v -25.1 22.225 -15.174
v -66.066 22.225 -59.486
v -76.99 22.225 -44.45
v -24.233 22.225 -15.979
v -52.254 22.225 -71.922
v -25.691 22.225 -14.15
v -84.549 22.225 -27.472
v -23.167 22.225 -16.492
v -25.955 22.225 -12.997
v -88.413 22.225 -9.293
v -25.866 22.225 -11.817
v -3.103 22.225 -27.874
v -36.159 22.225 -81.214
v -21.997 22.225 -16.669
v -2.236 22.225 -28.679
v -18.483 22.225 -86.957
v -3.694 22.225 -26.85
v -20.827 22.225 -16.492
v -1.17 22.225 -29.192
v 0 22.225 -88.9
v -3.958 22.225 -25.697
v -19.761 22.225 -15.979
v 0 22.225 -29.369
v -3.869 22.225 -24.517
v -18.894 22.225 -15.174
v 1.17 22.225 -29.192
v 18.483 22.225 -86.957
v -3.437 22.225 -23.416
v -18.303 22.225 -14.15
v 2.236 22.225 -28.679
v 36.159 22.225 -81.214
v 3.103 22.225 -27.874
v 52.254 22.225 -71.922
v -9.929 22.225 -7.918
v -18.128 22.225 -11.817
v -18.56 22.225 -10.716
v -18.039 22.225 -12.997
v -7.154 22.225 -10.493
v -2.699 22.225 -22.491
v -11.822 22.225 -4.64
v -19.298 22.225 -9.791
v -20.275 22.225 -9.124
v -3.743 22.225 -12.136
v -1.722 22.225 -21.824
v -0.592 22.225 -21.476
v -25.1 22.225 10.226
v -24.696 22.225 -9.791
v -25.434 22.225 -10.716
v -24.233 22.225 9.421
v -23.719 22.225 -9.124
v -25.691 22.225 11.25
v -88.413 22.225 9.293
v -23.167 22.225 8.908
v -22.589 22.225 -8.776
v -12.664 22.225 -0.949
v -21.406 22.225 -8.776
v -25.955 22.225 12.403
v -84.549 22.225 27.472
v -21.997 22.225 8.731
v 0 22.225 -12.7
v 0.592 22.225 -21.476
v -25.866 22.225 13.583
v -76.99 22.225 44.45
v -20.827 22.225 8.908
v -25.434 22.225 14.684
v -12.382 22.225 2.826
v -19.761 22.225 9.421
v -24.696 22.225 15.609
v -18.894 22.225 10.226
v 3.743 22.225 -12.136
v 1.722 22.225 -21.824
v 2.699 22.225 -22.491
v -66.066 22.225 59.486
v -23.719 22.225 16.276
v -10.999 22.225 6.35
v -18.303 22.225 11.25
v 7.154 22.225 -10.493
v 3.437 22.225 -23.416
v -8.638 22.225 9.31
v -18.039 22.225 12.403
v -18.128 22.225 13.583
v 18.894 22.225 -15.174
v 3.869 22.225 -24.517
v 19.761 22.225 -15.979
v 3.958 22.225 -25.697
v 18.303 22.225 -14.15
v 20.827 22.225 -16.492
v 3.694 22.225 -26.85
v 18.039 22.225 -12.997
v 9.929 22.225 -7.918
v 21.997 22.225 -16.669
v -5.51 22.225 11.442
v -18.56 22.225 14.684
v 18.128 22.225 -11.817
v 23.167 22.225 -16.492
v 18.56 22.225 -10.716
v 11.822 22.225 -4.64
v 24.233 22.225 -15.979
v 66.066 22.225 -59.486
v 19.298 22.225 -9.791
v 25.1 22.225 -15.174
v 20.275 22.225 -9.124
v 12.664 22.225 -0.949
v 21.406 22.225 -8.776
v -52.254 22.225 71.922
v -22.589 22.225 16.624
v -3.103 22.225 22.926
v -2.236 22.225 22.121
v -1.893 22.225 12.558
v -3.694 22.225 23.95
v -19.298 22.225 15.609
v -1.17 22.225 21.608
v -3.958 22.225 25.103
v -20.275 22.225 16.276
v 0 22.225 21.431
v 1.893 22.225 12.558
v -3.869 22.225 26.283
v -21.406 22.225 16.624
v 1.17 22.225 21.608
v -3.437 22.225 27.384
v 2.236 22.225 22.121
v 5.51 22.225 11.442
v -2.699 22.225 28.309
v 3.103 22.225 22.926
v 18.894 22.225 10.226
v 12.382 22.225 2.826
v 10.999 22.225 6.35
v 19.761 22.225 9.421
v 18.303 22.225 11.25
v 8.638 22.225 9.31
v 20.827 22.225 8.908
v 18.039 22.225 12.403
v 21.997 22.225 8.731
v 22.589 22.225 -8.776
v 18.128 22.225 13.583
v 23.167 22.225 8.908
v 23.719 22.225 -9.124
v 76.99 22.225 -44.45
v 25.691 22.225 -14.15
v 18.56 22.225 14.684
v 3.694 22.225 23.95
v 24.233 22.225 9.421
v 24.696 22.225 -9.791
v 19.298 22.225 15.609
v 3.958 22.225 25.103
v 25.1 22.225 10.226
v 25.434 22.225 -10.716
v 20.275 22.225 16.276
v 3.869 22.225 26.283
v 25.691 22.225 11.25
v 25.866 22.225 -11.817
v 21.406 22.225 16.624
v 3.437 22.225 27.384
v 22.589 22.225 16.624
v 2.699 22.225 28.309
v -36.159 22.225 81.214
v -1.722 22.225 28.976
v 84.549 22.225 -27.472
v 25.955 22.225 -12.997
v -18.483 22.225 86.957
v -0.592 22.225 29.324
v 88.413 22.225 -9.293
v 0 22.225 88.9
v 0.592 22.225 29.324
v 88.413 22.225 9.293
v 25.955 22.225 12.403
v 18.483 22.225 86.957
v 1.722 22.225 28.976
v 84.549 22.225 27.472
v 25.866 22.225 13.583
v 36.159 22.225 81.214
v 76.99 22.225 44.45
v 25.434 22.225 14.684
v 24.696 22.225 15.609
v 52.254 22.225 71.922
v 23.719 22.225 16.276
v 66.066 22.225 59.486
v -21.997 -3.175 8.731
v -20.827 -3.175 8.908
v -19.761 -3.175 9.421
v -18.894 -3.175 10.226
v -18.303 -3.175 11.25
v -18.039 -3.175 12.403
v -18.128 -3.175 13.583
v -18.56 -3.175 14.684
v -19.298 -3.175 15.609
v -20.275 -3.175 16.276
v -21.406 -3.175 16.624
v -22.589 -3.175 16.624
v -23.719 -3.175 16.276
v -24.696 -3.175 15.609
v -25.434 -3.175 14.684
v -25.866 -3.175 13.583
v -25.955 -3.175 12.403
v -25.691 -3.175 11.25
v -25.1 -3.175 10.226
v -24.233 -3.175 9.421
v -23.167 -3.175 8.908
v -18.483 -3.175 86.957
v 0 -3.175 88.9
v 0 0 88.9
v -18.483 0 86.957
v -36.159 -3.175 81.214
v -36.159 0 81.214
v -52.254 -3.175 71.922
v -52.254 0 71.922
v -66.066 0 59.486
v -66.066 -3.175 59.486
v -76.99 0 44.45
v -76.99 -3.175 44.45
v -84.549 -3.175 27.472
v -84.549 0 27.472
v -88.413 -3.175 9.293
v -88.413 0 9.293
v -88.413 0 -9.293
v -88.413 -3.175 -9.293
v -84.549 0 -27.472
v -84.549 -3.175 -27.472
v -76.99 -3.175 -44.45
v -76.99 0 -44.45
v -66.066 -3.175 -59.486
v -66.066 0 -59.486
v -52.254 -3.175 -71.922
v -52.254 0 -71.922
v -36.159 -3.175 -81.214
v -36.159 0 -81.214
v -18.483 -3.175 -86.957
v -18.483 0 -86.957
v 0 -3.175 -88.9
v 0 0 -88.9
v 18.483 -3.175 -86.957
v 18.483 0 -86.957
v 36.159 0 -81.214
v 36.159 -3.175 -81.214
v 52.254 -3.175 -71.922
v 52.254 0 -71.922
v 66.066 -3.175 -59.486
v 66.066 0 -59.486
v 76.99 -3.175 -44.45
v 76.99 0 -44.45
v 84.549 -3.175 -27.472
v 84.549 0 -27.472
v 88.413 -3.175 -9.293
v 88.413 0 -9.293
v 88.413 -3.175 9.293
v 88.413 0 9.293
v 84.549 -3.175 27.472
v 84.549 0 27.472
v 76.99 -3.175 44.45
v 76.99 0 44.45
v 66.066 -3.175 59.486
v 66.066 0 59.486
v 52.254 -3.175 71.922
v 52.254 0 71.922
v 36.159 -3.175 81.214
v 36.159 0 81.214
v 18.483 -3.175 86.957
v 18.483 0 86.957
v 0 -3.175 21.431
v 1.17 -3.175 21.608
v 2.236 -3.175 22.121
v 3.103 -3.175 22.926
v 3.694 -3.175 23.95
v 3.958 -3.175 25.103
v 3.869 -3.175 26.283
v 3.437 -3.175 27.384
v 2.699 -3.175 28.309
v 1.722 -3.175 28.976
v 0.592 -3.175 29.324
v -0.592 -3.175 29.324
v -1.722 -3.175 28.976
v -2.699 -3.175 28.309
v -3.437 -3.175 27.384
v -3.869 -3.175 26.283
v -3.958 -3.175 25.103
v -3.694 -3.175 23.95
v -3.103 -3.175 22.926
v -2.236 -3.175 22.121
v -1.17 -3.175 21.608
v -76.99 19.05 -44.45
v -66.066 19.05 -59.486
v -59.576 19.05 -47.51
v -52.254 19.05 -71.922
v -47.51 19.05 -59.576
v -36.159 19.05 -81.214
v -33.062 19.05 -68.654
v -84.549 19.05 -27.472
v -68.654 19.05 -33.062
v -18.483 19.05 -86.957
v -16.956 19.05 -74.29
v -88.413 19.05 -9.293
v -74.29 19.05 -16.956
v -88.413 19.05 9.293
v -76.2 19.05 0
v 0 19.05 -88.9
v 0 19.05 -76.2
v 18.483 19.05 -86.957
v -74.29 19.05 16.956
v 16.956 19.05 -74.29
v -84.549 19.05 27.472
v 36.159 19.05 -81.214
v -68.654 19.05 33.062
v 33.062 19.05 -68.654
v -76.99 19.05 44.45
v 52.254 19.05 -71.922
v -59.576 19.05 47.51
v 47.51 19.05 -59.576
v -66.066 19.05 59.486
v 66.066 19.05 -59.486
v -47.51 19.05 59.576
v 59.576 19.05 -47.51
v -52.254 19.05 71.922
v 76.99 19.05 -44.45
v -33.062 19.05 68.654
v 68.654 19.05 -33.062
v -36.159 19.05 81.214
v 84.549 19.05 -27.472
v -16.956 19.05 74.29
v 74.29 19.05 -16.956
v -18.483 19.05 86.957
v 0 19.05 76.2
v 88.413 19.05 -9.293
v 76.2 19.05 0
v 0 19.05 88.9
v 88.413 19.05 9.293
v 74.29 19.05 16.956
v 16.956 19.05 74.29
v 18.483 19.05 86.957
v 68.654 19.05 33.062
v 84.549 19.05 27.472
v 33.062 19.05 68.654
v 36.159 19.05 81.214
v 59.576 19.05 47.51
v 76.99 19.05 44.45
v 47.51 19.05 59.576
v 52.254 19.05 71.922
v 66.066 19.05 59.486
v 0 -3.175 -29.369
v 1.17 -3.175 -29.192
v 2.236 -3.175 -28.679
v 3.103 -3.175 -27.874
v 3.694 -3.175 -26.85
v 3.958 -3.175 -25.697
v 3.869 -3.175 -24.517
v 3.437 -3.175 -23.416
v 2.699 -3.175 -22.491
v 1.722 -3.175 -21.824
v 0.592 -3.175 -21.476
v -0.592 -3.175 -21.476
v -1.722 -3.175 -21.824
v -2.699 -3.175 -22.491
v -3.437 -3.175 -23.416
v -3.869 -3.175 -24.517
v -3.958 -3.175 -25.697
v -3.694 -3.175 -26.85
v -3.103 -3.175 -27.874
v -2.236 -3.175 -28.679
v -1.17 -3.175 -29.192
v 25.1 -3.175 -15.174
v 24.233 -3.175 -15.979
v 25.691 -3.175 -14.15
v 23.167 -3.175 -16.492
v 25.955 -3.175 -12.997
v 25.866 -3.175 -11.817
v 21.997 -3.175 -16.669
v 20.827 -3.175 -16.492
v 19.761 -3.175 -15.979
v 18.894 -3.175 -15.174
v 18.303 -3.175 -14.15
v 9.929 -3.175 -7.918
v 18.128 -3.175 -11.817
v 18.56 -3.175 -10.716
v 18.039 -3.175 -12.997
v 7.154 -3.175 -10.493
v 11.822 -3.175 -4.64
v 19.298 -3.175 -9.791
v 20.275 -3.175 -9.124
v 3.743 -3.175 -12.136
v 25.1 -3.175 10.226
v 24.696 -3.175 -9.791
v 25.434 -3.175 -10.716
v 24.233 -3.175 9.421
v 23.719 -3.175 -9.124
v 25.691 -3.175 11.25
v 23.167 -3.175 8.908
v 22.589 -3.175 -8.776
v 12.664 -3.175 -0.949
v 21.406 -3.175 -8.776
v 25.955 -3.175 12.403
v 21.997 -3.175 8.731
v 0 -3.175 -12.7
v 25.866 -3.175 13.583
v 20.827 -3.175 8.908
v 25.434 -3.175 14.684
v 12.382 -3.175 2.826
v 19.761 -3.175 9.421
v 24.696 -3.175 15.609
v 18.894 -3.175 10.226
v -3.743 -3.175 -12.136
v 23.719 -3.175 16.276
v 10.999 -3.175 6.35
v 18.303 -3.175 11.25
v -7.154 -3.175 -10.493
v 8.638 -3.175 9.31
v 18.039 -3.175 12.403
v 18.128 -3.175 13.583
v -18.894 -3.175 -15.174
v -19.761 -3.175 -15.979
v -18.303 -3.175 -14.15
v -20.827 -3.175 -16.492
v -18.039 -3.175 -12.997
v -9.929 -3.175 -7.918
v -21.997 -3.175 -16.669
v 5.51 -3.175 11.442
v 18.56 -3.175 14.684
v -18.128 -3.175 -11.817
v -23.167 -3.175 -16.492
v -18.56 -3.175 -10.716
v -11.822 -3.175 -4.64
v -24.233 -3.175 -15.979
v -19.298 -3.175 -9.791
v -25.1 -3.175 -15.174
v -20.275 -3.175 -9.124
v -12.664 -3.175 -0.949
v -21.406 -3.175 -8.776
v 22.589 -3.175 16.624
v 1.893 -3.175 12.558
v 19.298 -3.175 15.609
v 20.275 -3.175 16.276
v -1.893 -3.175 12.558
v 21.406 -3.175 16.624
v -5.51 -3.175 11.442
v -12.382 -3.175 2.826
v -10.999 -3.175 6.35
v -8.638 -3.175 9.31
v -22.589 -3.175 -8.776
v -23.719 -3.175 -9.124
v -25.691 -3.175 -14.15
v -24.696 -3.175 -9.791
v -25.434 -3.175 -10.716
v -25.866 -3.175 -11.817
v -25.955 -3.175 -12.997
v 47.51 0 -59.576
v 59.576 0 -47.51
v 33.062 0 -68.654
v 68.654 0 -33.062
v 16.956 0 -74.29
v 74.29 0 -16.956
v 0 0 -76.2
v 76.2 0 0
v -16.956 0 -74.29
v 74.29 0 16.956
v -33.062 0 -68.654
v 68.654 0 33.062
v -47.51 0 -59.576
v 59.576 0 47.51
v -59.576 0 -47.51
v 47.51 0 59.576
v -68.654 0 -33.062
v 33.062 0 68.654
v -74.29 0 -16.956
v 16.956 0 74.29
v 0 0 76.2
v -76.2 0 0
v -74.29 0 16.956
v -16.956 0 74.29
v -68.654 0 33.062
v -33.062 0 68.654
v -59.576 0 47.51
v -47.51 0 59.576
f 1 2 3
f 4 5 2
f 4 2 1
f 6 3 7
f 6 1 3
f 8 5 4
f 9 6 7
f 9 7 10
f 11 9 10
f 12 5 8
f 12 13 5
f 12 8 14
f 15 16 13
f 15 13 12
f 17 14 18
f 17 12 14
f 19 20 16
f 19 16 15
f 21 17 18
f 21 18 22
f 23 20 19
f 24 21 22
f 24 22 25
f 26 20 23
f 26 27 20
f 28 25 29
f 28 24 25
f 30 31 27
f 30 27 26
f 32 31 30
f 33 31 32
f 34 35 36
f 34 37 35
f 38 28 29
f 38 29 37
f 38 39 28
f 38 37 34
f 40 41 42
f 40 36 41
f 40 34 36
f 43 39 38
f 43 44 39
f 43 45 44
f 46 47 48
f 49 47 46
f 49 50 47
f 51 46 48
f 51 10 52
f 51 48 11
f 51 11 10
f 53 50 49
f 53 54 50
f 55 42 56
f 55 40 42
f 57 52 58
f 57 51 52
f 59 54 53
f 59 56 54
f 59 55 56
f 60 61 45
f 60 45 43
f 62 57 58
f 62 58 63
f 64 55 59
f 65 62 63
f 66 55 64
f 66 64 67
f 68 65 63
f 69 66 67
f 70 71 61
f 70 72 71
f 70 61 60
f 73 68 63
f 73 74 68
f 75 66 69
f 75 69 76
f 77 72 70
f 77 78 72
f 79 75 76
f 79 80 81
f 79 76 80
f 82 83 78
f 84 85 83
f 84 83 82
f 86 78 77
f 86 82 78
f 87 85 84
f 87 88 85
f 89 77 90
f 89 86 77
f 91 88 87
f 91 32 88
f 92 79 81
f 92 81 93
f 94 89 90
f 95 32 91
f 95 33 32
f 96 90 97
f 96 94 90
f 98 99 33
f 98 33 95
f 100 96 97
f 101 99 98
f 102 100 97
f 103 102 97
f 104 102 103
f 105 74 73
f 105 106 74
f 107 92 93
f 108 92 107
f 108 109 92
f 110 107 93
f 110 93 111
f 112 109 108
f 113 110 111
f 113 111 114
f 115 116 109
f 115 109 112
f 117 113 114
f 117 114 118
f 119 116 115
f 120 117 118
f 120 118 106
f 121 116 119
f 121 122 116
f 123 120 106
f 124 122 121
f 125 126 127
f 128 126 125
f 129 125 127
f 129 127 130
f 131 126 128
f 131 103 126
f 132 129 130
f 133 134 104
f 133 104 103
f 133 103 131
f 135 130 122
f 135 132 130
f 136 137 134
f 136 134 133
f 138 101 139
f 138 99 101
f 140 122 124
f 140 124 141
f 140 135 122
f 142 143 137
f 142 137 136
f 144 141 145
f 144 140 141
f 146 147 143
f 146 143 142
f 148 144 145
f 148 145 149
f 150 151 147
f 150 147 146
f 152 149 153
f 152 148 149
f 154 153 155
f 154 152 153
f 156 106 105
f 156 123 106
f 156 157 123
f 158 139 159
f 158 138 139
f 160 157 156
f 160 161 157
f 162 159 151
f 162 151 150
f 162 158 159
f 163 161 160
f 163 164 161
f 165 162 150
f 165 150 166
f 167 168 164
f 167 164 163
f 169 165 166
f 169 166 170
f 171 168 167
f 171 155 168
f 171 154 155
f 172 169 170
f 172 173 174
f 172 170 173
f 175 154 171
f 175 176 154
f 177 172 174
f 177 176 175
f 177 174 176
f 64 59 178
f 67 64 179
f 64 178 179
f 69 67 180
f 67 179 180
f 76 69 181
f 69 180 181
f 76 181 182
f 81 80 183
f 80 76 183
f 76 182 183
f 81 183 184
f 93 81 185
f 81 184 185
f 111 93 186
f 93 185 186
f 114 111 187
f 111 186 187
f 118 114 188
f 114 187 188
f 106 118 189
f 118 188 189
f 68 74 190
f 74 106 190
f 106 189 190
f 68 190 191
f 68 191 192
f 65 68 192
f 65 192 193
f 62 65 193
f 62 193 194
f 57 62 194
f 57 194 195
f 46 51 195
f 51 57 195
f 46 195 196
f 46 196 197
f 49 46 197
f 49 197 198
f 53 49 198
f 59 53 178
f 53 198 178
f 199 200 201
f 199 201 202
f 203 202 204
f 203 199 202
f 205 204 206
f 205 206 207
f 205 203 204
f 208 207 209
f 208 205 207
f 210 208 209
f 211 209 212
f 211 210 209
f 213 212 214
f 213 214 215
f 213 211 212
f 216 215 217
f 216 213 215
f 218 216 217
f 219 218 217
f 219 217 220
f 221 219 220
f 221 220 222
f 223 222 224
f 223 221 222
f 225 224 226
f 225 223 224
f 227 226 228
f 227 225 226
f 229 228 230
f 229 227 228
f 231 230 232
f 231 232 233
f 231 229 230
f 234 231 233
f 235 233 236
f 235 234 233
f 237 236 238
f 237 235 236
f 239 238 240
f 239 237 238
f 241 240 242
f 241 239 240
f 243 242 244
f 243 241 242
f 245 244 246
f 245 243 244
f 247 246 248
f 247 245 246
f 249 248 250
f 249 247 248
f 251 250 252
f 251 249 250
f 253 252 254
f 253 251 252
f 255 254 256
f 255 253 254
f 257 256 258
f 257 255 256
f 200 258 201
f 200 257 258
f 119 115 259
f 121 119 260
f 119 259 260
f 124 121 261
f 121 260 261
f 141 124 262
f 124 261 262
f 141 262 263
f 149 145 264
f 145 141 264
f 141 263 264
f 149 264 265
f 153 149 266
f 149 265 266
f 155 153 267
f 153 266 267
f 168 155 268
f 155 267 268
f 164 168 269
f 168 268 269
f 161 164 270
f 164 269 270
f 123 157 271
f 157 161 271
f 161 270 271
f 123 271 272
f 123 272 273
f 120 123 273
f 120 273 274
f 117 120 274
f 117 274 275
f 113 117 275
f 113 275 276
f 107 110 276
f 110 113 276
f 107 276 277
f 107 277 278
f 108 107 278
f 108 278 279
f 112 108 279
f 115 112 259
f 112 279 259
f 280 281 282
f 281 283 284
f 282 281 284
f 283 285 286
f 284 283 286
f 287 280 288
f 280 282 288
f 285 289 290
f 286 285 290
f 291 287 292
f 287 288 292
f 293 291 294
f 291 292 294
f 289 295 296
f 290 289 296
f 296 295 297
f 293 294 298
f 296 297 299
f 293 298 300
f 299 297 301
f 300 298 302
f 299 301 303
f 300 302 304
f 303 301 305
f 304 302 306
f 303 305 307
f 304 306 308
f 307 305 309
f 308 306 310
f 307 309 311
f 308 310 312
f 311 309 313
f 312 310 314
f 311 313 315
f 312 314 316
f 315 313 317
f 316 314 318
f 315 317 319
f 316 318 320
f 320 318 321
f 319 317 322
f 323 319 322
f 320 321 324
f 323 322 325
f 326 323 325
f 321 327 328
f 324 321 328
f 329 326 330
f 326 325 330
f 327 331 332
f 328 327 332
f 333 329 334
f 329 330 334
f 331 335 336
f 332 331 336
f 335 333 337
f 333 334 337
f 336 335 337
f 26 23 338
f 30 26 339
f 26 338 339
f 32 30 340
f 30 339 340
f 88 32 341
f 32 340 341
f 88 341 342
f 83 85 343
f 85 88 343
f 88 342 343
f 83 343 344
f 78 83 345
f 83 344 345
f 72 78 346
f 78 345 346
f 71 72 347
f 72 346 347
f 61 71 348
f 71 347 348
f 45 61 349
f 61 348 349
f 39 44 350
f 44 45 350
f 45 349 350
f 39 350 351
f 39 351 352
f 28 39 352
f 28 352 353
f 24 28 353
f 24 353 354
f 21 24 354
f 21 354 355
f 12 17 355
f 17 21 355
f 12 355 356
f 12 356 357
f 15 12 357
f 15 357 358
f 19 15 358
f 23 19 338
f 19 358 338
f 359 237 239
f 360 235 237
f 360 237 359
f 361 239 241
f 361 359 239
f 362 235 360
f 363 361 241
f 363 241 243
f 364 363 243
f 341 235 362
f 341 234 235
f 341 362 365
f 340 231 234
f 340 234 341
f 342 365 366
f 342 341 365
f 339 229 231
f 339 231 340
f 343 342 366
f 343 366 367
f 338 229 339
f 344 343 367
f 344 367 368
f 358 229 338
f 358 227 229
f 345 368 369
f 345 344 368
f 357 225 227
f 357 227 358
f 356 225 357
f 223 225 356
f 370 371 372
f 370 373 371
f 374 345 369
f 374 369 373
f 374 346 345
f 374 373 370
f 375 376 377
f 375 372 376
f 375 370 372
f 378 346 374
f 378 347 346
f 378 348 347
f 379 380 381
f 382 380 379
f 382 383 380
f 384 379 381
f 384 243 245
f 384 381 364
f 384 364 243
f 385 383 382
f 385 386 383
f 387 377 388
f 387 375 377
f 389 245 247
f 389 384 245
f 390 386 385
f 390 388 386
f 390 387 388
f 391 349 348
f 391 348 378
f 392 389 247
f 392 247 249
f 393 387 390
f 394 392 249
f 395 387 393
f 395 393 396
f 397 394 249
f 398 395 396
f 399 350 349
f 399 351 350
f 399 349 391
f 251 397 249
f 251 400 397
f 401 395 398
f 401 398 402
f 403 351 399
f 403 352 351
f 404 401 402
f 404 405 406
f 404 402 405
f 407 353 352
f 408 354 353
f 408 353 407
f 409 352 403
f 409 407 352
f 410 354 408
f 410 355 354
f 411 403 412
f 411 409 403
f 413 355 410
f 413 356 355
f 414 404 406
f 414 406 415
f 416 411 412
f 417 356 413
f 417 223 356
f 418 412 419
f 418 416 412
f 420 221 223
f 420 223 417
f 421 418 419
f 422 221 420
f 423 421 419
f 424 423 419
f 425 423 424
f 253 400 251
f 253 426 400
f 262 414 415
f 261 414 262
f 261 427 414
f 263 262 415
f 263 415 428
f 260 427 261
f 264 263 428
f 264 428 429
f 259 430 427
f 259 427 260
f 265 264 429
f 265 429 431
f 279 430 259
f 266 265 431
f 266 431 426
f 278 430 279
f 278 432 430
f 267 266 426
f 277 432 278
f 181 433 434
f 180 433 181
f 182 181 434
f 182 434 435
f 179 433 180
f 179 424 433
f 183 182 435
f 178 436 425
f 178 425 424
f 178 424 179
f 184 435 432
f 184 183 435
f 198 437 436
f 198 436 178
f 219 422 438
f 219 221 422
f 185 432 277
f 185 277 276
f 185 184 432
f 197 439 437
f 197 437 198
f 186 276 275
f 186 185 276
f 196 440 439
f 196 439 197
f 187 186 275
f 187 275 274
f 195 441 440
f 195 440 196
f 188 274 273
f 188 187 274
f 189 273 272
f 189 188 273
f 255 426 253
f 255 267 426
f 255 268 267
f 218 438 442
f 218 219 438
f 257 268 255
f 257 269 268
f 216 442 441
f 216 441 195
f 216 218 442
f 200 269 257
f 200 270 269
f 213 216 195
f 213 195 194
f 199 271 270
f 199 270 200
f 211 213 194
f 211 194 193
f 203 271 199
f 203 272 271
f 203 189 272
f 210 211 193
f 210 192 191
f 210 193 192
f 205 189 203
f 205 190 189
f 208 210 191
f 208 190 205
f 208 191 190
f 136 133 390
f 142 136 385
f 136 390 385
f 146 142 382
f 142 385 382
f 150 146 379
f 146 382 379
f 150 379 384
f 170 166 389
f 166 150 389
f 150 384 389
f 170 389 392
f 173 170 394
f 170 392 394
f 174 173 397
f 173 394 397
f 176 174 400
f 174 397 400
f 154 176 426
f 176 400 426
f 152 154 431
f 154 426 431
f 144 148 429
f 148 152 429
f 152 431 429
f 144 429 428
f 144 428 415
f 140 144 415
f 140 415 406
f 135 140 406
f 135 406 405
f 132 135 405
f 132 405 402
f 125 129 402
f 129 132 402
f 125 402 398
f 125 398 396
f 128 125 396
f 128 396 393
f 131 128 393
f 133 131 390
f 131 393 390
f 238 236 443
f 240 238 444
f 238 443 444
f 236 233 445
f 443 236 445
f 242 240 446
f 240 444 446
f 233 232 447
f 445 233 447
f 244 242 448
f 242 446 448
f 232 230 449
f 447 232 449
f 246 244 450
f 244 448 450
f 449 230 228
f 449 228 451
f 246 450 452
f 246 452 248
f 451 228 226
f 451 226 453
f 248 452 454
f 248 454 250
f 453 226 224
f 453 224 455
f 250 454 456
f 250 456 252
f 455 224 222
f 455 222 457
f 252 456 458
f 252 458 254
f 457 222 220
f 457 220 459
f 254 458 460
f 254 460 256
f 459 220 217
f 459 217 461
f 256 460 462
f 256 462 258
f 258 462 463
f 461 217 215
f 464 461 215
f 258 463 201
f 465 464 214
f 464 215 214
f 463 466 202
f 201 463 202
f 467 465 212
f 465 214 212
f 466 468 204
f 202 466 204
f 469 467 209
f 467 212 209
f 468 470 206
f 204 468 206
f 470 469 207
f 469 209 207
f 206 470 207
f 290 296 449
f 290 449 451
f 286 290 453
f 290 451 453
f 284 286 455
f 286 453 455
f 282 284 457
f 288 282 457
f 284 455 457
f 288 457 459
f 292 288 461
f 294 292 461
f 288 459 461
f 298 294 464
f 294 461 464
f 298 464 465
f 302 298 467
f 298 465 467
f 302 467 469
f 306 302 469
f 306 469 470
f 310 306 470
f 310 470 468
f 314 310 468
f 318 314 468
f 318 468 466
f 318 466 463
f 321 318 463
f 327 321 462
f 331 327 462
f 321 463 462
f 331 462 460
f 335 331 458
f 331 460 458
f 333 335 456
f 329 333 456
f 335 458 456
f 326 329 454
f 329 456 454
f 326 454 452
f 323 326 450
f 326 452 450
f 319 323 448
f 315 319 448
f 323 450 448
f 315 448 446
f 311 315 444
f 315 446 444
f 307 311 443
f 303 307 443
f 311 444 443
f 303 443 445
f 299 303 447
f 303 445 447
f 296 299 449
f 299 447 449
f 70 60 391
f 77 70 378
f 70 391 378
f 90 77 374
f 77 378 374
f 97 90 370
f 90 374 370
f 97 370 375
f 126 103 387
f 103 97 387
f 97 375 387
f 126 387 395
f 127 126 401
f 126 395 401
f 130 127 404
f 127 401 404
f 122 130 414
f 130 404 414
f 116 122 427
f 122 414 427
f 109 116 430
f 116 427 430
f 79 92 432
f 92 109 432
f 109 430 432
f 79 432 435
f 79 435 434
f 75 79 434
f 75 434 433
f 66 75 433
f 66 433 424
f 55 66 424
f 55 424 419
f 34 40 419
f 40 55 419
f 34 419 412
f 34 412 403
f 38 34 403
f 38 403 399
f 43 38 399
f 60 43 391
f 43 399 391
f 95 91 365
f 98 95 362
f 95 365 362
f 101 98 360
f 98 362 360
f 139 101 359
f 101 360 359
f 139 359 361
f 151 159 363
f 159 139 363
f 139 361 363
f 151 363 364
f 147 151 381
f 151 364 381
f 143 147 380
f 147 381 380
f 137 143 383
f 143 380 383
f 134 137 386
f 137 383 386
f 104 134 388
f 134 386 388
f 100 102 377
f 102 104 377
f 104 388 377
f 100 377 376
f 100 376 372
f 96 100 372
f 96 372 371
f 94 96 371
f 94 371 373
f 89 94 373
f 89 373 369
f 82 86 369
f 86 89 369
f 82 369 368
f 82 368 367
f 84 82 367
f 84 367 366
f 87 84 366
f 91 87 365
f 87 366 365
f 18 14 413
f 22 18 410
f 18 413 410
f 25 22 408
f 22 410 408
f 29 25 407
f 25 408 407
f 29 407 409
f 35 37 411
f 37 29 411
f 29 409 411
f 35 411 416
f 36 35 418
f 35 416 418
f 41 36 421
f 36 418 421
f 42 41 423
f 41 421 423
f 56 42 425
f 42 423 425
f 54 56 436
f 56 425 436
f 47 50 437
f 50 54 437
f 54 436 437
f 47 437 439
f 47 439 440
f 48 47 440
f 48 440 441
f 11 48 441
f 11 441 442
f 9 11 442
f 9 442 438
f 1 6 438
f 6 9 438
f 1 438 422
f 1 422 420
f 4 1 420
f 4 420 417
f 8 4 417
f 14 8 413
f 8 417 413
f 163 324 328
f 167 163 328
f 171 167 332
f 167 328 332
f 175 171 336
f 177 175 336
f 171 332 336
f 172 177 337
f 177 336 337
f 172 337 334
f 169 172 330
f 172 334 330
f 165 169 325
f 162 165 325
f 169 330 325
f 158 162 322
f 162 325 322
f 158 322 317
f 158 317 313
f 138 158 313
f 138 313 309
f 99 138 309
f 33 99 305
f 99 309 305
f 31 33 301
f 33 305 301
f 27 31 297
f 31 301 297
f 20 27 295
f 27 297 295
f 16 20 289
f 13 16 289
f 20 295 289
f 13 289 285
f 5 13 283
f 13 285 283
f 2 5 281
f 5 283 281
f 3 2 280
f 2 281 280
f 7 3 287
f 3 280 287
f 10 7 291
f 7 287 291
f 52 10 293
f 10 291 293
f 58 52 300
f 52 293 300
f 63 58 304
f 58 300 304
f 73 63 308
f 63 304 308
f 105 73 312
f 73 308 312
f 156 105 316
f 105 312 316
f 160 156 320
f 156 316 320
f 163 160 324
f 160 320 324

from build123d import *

# Parameters (mm, degrees)
SKETCH2_R           = 76.2
SKETCH2_R_2         = 3.96875
SKETCH2_R_3         = 12.7
BOSS_EXTRUDE1_DEPTH = 19.05
SKETCH3_R           = 88.9
SKETCH3_R_2         = 3.96875
SKETCH3_R_3         = 12.7
BOSS_EXTRUDE2_DEPTH = 3.175
BOSS_EXTRUDE3_START = 3.175
SKETCH4_R           = 88.9
SKETCH4_R_2         = 12.7
SKETCH4_R_3         = 3.96875
BOSS_EXTRUDE3_DEPTH = 3.175


with BuildPart() as part:
    # Sketch2 → Boss-Extrude1 (new body)
    with BuildSketch(Plane(origin=(0, 0, 0), x_dir=(1, 0, 0), z_dir=(0, 1, 0))):
        with Locations(Location((0, 0, 0), (0, 0, 90))):
            Circle(SKETCH2_R)
        with Locations(Location((0, 25.4, 0), (0, 0, 90))):
            Circle(SKETCH2_R_2, mode=Mode.SUBTRACT)
        with Locations(Location((21.997045256, 12.7, 0), (0, 0, 90))):
            Circle(SKETCH2_R_2, mode=Mode.SUBTRACT)
        with Locations(Location((21.997045256, -12.7, 0), (0, 0, 90))):
            Circle(SKETCH2_R_2, mode=Mode.SUBTRACT)
        with Locations(Location((0, -25.4, 0), (0, 0, 90))):
            Circle(SKETCH2_R_2, mode=Mode.SUBTRACT)
        with Locations(Location((-21.997045256, -12.7, 0), (0, 0, 90))):
            Circle(SKETCH2_R_2, mode=Mode.SUBTRACT)
        with Locations(Location((-21.997045256, 12.7, 0), (0, 0, 90))):
            Circle(SKETCH2_R_2, mode=Mode.SUBTRACT)
        with Locations(Location((0, 0, 0), (0, 0, 90))):
            Circle(SKETCH2_R_3, mode=Mode.SUBTRACT)
    extrude(amount=BOSS_EXTRUDE1_DEPTH)

    # Sketch3 → Boss-Extrude2 (add)
    with BuildSketch(Plane(origin=(0, 19.05, 0), x_dir=(1, 0, 0), z_dir=(0, 1, 0))):
        with Locations(Location((0, 0, 0), (0, 0, 270))):
            Circle(SKETCH3_R)
        with Locations(Location((0, 25.4, 0), (0, 0, 90))):
            Circle(SKETCH3_R_2, mode=Mode.SUBTRACT)
        with Locations(Location((21.997045256, 12.7, 0), (0, 0, 90))):
            Circle(SKETCH3_R_2, mode=Mode.SUBTRACT)
        with Locations(Location((21.997045256, -12.7, 0), (0, 0, 90))):
            Circle(SKETCH3_R_2, mode=Mode.SUBTRACT)
        with Locations(Location((0, -25.4, 0), (0, 0, 90))):
            Circle(SKETCH3_R_2, mode=Mode.SUBTRACT)
        with Locations(Location((-21.997045256, -12.7, 0), (0, 0, 90))):
            Circle(SKETCH3_R_2, mode=Mode.SUBTRACT)
        with Locations(Location((0, 0, 0), (0, 0, 90))):
            Circle(SKETCH3_R_3, mode=Mode.SUBTRACT)
        with Locations(Location((-21.997045256, 12.7, 0), (0, 0, 90))):
            Circle(SKETCH3_R_2, mode=Mode.SUBTRACT)
    extrude(amount=BOSS_EXTRUDE2_DEPTH)

    # Sketch4 → Boss-Extrude3 (add)
    with BuildSketch(Plane.XZ.offset(BOSS_EXTRUDE3_START)):
        with Locations(Location((0, 0, 0), (0, 0, 90))):
            Circle(SKETCH4_R)
        with Locations(Location((0, 0, 0), (0, 0, 270))):
            Circle(SKETCH4_R_2, mode=Mode.SUBTRACT)
        with Locations(Location((-21.997045256, -12.7, 0), (0, 0, 270))):
            Circle(SKETCH4_R_3, mode=Mode.SUBTRACT)
        with Locations(Location((0, -25.4, 0), (0, 0, 270))):
            Circle(SKETCH4_R_3, mode=Mode.SUBTRACT)
        with Locations(Location((21.997045256, -12.7, 0), (0, 0, 270))):
            Circle(SKETCH4_R_3, mode=Mode.SUBTRACT)
        with Locations(Location((21.997045256, 12.7, 0), (0, 0, 270))):
            Circle(SKETCH4_R_3, mode=Mode.SUBTRACT)
        with Locations(Location((0, 25.4, 0), (0, 0, 270))):
            Circle(SKETCH4_R_3, mode=Mode.SUBTRACT)
        with Locations(Location((-21.997045256, 12.7, 0), (0, 0, 270))):
            Circle(SKETCH4_R_3, mode=Mode.SUBTRACT)
    extrude(amount=-BOSS_EXTRUDE3_DEPTH)


solid = part.part
